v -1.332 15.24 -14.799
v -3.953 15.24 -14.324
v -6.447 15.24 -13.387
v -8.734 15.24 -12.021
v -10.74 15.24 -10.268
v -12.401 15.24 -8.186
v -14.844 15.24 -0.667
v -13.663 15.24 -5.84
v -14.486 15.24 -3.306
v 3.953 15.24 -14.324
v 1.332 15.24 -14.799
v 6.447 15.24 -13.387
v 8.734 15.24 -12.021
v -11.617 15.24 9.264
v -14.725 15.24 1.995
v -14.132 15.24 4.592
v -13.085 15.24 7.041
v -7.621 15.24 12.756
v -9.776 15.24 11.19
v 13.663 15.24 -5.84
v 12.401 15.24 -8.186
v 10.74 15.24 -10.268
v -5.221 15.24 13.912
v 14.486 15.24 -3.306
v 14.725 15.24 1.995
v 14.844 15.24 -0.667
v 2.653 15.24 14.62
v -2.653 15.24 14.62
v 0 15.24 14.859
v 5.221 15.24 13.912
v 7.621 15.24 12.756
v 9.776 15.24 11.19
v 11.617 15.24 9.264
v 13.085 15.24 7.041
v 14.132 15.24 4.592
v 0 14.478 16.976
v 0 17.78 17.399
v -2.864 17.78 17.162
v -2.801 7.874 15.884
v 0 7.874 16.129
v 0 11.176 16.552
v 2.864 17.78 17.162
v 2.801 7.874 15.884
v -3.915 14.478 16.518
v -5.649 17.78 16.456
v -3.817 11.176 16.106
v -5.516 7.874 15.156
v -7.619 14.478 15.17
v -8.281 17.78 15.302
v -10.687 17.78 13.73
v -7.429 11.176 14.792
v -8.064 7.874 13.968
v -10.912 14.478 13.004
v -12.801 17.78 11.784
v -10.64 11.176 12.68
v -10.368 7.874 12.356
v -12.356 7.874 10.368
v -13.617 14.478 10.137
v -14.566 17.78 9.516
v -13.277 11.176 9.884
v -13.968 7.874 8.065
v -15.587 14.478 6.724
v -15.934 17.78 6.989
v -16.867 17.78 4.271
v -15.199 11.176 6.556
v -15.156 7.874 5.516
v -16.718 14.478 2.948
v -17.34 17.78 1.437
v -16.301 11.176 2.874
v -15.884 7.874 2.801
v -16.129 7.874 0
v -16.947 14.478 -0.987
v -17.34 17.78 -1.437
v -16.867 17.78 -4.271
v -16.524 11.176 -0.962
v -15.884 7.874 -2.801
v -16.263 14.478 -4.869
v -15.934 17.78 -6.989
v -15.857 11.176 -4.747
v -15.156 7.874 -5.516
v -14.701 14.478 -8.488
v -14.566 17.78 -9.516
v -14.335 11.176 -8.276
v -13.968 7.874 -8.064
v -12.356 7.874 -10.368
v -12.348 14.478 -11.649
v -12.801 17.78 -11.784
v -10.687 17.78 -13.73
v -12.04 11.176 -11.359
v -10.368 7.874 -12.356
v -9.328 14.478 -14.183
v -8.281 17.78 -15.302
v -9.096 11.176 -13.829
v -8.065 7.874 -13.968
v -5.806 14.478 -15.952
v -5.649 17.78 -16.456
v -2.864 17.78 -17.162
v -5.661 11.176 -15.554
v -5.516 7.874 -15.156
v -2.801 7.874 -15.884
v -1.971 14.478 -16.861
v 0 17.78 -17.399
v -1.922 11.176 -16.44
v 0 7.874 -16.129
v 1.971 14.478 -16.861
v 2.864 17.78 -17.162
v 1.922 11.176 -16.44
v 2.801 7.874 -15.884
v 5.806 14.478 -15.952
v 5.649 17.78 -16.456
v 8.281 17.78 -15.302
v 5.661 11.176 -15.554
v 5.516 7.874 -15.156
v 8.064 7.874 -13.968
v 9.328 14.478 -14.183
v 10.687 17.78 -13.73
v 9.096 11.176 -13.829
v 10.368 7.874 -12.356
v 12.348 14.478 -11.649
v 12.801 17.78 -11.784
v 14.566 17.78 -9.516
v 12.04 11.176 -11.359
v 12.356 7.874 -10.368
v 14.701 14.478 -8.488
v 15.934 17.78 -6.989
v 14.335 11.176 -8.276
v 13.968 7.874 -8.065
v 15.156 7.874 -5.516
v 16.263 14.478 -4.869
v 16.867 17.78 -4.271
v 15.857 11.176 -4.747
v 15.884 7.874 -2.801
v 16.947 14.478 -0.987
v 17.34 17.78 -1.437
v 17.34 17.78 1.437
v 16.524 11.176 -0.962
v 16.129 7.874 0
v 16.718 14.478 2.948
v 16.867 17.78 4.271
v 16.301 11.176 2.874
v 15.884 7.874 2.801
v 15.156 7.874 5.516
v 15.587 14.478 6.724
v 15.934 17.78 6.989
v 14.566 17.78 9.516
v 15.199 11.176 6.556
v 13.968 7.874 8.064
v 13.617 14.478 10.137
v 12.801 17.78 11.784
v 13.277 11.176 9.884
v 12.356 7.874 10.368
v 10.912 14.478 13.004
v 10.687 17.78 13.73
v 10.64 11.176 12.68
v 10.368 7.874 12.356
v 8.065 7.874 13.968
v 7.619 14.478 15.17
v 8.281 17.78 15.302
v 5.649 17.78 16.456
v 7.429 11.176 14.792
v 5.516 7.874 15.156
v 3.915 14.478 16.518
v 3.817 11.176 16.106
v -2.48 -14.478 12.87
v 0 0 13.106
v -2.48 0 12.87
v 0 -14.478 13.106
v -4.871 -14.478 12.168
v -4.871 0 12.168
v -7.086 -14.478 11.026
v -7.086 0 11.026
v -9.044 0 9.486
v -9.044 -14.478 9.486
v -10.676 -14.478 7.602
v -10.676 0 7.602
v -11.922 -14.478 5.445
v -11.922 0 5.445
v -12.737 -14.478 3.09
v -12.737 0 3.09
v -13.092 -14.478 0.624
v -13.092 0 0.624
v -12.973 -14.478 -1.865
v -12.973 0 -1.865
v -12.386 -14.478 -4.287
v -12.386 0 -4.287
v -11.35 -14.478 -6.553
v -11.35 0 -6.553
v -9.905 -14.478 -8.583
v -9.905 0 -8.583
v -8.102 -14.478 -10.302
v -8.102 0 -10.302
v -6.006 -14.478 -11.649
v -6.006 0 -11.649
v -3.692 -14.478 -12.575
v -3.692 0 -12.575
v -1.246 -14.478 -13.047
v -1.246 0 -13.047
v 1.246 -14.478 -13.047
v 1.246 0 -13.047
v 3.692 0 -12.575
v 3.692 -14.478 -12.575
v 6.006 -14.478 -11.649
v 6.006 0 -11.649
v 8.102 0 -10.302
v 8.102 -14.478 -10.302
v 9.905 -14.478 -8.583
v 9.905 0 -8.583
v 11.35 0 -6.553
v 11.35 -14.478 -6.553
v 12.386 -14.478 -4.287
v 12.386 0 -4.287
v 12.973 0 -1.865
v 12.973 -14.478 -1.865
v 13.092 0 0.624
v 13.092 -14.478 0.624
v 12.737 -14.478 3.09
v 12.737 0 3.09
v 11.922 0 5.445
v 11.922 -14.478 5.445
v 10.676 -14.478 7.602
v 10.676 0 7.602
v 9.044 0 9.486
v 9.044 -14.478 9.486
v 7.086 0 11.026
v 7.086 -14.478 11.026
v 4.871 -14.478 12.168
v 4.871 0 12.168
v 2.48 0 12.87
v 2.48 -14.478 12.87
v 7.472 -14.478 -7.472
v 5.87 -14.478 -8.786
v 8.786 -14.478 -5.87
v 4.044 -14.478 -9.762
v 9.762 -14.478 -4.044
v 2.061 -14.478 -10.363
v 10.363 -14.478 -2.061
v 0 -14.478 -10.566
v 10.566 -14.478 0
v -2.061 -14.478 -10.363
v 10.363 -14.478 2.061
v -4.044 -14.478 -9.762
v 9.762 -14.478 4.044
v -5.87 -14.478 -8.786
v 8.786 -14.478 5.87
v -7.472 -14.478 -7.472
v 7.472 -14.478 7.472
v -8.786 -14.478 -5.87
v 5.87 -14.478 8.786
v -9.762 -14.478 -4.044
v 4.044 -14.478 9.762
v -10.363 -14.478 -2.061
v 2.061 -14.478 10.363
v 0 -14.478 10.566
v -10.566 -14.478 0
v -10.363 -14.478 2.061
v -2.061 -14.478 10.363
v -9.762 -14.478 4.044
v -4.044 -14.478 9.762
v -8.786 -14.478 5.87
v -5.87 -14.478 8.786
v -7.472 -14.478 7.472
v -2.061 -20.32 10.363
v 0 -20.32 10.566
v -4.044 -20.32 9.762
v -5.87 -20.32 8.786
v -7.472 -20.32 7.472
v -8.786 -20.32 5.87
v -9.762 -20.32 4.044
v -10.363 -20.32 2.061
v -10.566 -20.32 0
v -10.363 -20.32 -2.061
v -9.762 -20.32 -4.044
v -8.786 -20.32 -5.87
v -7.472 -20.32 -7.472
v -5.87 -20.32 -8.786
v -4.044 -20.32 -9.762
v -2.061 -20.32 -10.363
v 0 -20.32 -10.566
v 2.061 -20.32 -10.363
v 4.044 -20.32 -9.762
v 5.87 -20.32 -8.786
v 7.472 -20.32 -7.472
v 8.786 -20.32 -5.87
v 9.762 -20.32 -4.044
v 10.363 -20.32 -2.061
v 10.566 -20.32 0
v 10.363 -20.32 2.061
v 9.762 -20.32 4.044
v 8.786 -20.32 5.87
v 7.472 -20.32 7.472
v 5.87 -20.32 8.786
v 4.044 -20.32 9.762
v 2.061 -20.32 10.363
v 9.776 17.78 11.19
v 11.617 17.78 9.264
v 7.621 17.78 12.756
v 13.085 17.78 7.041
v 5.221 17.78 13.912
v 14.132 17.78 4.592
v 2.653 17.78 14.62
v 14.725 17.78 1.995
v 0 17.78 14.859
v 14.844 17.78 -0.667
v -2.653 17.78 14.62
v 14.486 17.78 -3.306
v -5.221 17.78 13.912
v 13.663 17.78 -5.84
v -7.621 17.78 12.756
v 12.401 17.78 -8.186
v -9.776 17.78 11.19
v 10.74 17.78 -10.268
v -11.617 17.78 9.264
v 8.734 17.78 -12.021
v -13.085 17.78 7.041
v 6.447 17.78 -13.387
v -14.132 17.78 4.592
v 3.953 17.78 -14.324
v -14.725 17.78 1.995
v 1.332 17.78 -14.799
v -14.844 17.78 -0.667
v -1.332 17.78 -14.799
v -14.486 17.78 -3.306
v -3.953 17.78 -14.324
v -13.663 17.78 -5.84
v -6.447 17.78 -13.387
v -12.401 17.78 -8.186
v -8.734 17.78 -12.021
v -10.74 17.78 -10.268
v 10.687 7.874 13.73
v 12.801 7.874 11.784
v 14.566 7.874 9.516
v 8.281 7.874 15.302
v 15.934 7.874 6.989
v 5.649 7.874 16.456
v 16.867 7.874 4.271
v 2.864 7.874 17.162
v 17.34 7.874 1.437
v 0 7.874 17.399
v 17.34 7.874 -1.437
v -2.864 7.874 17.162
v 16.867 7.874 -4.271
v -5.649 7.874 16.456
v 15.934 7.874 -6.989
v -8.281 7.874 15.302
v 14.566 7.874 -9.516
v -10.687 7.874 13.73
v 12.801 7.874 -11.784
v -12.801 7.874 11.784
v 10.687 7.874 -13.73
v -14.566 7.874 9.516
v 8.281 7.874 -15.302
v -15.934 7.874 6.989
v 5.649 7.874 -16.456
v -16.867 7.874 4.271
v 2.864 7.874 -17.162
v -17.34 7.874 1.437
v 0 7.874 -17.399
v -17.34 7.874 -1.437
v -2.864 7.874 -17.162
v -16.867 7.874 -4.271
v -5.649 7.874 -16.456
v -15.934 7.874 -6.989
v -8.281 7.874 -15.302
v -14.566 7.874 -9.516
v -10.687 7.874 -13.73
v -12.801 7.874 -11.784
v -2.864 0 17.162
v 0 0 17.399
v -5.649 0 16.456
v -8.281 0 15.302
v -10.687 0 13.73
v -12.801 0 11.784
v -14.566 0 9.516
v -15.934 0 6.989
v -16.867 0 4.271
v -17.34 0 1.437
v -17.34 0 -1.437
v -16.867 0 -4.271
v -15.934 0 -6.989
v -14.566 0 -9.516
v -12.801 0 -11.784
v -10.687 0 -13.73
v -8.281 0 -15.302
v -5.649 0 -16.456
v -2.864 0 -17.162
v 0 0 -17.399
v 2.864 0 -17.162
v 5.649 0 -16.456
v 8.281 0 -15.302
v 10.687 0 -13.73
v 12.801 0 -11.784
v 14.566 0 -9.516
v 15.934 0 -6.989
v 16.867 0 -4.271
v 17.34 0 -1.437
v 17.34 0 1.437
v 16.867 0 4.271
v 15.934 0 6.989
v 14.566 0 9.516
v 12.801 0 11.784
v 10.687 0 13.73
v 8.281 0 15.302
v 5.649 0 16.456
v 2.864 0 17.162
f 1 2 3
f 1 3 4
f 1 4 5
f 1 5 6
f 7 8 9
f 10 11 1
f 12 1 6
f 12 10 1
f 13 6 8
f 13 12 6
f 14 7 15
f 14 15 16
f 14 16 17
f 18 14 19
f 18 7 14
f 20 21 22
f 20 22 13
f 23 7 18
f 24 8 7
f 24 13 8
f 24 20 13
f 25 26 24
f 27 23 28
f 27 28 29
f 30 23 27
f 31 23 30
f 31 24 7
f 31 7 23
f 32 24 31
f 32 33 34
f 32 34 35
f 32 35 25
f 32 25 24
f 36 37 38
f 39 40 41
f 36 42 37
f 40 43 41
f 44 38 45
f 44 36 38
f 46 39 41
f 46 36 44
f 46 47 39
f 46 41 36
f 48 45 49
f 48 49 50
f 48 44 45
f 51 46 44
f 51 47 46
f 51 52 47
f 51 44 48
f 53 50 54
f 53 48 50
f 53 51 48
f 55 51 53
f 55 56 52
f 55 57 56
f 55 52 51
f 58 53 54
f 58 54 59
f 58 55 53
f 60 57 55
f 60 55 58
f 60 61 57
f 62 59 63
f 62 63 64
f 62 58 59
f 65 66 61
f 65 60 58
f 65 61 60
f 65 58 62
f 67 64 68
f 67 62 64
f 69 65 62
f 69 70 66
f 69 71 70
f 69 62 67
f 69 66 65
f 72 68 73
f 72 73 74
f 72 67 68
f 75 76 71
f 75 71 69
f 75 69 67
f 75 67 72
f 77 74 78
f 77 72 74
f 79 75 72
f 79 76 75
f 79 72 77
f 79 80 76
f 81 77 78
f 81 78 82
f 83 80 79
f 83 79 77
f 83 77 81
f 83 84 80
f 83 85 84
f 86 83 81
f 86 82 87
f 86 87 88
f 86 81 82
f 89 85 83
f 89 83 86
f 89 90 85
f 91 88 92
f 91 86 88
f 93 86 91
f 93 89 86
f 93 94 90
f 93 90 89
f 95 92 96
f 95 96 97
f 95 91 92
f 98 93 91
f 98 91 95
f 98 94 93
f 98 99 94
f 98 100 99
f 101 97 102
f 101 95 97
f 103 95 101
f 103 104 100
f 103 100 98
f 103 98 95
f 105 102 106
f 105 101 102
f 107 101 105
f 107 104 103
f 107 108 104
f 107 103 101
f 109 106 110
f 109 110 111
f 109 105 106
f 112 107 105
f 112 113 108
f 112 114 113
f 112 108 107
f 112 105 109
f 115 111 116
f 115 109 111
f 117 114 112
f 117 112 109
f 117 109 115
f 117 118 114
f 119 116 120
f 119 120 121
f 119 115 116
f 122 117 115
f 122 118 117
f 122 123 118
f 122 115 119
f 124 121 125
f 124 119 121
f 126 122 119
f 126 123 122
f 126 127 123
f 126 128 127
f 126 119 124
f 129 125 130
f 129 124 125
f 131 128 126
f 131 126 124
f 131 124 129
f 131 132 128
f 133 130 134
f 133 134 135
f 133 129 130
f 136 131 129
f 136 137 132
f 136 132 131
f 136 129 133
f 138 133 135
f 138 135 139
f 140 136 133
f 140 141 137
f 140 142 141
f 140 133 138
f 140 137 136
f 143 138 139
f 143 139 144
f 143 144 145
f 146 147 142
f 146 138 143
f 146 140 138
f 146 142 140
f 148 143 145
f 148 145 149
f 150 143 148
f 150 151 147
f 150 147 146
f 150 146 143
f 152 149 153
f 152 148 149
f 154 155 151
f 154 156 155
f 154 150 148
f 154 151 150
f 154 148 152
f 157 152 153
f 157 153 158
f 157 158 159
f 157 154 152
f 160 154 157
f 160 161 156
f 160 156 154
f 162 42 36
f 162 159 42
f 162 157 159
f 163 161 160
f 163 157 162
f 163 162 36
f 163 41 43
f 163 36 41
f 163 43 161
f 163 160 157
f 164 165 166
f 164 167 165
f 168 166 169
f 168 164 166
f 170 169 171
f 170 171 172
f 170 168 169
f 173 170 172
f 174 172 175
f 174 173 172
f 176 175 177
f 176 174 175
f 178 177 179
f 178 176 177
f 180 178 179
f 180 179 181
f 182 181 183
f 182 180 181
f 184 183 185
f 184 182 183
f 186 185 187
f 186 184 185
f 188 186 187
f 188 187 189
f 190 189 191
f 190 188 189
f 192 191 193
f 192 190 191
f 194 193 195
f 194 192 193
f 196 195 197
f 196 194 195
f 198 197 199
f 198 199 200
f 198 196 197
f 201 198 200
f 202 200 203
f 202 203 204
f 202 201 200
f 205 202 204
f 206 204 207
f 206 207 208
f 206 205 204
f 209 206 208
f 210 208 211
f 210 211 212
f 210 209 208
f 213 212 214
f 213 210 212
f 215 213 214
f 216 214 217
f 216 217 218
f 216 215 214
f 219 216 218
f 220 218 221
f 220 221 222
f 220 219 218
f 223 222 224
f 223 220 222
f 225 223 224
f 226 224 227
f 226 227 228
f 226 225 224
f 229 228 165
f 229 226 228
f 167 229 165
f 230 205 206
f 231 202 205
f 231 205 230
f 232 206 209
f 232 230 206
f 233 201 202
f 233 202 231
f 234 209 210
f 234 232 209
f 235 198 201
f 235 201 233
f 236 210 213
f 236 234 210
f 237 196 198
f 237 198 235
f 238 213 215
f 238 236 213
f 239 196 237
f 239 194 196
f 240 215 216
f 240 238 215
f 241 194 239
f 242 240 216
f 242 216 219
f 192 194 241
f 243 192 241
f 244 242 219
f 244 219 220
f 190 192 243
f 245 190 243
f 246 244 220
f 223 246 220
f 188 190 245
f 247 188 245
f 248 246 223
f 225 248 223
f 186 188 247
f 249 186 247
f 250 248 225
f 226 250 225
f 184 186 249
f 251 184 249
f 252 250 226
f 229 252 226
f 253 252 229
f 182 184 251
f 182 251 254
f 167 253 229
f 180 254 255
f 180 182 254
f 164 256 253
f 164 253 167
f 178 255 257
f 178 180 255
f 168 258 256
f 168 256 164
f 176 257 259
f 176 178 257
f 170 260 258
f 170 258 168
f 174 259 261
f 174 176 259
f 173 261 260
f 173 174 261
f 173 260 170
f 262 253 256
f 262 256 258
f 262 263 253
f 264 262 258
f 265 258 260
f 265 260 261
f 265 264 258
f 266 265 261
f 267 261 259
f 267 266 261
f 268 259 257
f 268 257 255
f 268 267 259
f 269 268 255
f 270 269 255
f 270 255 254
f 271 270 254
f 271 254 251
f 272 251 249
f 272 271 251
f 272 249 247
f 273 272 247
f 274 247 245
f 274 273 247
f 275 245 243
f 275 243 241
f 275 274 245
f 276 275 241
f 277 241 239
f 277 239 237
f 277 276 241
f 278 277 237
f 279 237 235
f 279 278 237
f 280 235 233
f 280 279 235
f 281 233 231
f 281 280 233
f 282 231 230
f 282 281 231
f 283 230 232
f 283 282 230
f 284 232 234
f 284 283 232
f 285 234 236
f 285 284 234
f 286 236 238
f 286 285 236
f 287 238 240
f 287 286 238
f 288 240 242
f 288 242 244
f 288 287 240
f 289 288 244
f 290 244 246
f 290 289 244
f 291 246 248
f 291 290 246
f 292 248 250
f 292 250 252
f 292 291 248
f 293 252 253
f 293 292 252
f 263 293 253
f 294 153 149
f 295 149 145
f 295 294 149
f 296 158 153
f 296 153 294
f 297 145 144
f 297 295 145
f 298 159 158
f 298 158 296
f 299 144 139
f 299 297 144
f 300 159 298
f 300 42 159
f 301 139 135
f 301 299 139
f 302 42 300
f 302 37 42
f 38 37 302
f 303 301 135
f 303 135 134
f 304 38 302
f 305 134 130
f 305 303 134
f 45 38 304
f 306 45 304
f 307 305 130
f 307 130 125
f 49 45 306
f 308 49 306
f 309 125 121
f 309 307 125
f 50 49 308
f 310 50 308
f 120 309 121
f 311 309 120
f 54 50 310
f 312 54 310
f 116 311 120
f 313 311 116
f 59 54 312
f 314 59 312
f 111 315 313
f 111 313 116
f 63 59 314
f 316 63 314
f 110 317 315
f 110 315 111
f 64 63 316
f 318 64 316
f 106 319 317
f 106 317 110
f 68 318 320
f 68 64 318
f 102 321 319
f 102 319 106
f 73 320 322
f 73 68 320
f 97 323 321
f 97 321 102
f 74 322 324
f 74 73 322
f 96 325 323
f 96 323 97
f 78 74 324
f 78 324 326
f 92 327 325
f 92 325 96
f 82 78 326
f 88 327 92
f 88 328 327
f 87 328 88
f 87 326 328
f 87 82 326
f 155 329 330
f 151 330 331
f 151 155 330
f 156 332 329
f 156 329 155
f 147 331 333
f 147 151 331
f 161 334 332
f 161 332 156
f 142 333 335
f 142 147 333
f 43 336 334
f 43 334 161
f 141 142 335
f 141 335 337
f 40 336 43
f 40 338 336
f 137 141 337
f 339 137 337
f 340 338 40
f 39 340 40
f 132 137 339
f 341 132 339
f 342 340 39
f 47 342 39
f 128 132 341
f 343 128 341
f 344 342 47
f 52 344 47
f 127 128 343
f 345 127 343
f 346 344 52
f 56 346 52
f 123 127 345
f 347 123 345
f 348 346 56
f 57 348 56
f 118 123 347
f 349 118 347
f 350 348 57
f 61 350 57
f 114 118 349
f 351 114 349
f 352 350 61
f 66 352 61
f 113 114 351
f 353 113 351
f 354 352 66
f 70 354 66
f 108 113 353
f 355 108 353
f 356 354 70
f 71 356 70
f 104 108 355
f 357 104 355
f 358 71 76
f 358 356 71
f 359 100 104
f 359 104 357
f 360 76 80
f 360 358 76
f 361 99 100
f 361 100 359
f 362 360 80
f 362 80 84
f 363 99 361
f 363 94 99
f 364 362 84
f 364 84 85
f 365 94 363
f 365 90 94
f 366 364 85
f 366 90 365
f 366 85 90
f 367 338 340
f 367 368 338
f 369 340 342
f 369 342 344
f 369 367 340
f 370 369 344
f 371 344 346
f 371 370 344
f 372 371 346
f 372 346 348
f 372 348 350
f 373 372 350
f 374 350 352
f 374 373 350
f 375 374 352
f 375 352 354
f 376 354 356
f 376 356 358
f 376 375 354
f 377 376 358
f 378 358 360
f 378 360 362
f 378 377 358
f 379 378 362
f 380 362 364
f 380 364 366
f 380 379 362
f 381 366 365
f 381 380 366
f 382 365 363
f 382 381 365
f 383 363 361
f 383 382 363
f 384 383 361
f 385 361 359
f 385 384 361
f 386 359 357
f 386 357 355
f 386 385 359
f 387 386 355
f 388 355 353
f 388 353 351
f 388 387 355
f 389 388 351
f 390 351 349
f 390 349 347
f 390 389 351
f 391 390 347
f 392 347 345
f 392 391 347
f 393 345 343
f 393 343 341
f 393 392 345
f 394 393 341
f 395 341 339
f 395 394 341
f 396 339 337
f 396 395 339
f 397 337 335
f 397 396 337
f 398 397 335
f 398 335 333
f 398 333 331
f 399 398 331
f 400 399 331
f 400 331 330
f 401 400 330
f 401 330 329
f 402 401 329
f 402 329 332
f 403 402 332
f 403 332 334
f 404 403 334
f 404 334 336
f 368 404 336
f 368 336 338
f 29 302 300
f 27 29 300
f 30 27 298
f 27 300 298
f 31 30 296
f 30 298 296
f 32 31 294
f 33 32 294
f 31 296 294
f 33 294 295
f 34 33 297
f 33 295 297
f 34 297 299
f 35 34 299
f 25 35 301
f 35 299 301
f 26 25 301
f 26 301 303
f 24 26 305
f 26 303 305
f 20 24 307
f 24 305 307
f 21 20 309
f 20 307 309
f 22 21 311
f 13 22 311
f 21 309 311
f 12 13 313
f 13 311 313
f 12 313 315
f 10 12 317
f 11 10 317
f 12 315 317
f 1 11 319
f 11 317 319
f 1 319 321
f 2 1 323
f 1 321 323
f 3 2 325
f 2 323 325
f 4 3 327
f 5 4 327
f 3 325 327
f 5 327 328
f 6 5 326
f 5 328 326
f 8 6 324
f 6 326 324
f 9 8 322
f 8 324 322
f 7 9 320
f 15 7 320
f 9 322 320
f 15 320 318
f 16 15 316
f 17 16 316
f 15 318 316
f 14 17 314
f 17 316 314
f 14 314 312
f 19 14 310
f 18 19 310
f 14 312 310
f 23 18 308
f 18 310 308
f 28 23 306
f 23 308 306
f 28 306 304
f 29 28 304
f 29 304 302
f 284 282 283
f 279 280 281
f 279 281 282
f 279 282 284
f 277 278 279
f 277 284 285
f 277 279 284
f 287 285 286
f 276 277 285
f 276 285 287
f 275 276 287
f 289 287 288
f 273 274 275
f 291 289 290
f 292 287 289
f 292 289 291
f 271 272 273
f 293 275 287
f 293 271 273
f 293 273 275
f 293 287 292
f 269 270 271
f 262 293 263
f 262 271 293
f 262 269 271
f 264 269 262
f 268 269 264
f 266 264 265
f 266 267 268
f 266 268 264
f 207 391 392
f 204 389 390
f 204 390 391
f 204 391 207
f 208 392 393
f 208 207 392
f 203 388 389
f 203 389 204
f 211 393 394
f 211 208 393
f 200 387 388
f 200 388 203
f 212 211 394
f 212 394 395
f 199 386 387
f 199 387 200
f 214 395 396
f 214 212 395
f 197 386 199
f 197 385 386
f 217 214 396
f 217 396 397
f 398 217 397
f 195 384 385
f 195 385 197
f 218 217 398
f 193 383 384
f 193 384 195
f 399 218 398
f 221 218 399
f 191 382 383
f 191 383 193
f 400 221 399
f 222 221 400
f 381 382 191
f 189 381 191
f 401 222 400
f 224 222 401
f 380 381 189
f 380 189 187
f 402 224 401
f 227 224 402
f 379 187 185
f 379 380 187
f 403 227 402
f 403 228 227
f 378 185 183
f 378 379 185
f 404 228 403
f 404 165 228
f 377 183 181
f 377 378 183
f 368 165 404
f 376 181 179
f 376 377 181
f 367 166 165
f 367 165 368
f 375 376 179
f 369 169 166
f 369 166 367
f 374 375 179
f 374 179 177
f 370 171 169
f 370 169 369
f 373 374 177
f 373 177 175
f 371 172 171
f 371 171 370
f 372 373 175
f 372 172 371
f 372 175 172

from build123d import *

# Parameters (mm, degrees)
SKETCH2_R          = 14.859
CUT_EXTRUDE1_DEPTH = 2.54


with BuildPart() as part:
    # Sketch1 → Revolve1 (revolve)
    with BuildSketch(Plane(origin=(0, 0, 0), x_dir=(0, 0, -1), z_dir=(1, 0, 0))):
        Polygon((0, 17.78), (-17.399, 17.78), (-16.129, 7.874), (-17.399, 7.874), (-17.399, 0), (-13.1064, 0), (-13.1064, -14.478), (-10.5664, -14.478), (-10.5664, -20.32), (0, -20.32), align=None)
    revolve(axis=Axis((0, 17.78, 0), (0, -1, 0)))

    # Sketch2 → Cut-Extrude1 (cut)
    with BuildSketch(Plane(origin=(0, 17.78, 0), x_dir=(1, 0, 0), z_dir=(0, 1, 0))):
        with Locations(Location((0, 0, 0), (0, 0, 270))):
            Circle(SKETCH2_R)
    extrude(amount=-CUT_EXTRUDE1_DEPTH, mode=Mode.SUBTRACT)


solid = part.part
